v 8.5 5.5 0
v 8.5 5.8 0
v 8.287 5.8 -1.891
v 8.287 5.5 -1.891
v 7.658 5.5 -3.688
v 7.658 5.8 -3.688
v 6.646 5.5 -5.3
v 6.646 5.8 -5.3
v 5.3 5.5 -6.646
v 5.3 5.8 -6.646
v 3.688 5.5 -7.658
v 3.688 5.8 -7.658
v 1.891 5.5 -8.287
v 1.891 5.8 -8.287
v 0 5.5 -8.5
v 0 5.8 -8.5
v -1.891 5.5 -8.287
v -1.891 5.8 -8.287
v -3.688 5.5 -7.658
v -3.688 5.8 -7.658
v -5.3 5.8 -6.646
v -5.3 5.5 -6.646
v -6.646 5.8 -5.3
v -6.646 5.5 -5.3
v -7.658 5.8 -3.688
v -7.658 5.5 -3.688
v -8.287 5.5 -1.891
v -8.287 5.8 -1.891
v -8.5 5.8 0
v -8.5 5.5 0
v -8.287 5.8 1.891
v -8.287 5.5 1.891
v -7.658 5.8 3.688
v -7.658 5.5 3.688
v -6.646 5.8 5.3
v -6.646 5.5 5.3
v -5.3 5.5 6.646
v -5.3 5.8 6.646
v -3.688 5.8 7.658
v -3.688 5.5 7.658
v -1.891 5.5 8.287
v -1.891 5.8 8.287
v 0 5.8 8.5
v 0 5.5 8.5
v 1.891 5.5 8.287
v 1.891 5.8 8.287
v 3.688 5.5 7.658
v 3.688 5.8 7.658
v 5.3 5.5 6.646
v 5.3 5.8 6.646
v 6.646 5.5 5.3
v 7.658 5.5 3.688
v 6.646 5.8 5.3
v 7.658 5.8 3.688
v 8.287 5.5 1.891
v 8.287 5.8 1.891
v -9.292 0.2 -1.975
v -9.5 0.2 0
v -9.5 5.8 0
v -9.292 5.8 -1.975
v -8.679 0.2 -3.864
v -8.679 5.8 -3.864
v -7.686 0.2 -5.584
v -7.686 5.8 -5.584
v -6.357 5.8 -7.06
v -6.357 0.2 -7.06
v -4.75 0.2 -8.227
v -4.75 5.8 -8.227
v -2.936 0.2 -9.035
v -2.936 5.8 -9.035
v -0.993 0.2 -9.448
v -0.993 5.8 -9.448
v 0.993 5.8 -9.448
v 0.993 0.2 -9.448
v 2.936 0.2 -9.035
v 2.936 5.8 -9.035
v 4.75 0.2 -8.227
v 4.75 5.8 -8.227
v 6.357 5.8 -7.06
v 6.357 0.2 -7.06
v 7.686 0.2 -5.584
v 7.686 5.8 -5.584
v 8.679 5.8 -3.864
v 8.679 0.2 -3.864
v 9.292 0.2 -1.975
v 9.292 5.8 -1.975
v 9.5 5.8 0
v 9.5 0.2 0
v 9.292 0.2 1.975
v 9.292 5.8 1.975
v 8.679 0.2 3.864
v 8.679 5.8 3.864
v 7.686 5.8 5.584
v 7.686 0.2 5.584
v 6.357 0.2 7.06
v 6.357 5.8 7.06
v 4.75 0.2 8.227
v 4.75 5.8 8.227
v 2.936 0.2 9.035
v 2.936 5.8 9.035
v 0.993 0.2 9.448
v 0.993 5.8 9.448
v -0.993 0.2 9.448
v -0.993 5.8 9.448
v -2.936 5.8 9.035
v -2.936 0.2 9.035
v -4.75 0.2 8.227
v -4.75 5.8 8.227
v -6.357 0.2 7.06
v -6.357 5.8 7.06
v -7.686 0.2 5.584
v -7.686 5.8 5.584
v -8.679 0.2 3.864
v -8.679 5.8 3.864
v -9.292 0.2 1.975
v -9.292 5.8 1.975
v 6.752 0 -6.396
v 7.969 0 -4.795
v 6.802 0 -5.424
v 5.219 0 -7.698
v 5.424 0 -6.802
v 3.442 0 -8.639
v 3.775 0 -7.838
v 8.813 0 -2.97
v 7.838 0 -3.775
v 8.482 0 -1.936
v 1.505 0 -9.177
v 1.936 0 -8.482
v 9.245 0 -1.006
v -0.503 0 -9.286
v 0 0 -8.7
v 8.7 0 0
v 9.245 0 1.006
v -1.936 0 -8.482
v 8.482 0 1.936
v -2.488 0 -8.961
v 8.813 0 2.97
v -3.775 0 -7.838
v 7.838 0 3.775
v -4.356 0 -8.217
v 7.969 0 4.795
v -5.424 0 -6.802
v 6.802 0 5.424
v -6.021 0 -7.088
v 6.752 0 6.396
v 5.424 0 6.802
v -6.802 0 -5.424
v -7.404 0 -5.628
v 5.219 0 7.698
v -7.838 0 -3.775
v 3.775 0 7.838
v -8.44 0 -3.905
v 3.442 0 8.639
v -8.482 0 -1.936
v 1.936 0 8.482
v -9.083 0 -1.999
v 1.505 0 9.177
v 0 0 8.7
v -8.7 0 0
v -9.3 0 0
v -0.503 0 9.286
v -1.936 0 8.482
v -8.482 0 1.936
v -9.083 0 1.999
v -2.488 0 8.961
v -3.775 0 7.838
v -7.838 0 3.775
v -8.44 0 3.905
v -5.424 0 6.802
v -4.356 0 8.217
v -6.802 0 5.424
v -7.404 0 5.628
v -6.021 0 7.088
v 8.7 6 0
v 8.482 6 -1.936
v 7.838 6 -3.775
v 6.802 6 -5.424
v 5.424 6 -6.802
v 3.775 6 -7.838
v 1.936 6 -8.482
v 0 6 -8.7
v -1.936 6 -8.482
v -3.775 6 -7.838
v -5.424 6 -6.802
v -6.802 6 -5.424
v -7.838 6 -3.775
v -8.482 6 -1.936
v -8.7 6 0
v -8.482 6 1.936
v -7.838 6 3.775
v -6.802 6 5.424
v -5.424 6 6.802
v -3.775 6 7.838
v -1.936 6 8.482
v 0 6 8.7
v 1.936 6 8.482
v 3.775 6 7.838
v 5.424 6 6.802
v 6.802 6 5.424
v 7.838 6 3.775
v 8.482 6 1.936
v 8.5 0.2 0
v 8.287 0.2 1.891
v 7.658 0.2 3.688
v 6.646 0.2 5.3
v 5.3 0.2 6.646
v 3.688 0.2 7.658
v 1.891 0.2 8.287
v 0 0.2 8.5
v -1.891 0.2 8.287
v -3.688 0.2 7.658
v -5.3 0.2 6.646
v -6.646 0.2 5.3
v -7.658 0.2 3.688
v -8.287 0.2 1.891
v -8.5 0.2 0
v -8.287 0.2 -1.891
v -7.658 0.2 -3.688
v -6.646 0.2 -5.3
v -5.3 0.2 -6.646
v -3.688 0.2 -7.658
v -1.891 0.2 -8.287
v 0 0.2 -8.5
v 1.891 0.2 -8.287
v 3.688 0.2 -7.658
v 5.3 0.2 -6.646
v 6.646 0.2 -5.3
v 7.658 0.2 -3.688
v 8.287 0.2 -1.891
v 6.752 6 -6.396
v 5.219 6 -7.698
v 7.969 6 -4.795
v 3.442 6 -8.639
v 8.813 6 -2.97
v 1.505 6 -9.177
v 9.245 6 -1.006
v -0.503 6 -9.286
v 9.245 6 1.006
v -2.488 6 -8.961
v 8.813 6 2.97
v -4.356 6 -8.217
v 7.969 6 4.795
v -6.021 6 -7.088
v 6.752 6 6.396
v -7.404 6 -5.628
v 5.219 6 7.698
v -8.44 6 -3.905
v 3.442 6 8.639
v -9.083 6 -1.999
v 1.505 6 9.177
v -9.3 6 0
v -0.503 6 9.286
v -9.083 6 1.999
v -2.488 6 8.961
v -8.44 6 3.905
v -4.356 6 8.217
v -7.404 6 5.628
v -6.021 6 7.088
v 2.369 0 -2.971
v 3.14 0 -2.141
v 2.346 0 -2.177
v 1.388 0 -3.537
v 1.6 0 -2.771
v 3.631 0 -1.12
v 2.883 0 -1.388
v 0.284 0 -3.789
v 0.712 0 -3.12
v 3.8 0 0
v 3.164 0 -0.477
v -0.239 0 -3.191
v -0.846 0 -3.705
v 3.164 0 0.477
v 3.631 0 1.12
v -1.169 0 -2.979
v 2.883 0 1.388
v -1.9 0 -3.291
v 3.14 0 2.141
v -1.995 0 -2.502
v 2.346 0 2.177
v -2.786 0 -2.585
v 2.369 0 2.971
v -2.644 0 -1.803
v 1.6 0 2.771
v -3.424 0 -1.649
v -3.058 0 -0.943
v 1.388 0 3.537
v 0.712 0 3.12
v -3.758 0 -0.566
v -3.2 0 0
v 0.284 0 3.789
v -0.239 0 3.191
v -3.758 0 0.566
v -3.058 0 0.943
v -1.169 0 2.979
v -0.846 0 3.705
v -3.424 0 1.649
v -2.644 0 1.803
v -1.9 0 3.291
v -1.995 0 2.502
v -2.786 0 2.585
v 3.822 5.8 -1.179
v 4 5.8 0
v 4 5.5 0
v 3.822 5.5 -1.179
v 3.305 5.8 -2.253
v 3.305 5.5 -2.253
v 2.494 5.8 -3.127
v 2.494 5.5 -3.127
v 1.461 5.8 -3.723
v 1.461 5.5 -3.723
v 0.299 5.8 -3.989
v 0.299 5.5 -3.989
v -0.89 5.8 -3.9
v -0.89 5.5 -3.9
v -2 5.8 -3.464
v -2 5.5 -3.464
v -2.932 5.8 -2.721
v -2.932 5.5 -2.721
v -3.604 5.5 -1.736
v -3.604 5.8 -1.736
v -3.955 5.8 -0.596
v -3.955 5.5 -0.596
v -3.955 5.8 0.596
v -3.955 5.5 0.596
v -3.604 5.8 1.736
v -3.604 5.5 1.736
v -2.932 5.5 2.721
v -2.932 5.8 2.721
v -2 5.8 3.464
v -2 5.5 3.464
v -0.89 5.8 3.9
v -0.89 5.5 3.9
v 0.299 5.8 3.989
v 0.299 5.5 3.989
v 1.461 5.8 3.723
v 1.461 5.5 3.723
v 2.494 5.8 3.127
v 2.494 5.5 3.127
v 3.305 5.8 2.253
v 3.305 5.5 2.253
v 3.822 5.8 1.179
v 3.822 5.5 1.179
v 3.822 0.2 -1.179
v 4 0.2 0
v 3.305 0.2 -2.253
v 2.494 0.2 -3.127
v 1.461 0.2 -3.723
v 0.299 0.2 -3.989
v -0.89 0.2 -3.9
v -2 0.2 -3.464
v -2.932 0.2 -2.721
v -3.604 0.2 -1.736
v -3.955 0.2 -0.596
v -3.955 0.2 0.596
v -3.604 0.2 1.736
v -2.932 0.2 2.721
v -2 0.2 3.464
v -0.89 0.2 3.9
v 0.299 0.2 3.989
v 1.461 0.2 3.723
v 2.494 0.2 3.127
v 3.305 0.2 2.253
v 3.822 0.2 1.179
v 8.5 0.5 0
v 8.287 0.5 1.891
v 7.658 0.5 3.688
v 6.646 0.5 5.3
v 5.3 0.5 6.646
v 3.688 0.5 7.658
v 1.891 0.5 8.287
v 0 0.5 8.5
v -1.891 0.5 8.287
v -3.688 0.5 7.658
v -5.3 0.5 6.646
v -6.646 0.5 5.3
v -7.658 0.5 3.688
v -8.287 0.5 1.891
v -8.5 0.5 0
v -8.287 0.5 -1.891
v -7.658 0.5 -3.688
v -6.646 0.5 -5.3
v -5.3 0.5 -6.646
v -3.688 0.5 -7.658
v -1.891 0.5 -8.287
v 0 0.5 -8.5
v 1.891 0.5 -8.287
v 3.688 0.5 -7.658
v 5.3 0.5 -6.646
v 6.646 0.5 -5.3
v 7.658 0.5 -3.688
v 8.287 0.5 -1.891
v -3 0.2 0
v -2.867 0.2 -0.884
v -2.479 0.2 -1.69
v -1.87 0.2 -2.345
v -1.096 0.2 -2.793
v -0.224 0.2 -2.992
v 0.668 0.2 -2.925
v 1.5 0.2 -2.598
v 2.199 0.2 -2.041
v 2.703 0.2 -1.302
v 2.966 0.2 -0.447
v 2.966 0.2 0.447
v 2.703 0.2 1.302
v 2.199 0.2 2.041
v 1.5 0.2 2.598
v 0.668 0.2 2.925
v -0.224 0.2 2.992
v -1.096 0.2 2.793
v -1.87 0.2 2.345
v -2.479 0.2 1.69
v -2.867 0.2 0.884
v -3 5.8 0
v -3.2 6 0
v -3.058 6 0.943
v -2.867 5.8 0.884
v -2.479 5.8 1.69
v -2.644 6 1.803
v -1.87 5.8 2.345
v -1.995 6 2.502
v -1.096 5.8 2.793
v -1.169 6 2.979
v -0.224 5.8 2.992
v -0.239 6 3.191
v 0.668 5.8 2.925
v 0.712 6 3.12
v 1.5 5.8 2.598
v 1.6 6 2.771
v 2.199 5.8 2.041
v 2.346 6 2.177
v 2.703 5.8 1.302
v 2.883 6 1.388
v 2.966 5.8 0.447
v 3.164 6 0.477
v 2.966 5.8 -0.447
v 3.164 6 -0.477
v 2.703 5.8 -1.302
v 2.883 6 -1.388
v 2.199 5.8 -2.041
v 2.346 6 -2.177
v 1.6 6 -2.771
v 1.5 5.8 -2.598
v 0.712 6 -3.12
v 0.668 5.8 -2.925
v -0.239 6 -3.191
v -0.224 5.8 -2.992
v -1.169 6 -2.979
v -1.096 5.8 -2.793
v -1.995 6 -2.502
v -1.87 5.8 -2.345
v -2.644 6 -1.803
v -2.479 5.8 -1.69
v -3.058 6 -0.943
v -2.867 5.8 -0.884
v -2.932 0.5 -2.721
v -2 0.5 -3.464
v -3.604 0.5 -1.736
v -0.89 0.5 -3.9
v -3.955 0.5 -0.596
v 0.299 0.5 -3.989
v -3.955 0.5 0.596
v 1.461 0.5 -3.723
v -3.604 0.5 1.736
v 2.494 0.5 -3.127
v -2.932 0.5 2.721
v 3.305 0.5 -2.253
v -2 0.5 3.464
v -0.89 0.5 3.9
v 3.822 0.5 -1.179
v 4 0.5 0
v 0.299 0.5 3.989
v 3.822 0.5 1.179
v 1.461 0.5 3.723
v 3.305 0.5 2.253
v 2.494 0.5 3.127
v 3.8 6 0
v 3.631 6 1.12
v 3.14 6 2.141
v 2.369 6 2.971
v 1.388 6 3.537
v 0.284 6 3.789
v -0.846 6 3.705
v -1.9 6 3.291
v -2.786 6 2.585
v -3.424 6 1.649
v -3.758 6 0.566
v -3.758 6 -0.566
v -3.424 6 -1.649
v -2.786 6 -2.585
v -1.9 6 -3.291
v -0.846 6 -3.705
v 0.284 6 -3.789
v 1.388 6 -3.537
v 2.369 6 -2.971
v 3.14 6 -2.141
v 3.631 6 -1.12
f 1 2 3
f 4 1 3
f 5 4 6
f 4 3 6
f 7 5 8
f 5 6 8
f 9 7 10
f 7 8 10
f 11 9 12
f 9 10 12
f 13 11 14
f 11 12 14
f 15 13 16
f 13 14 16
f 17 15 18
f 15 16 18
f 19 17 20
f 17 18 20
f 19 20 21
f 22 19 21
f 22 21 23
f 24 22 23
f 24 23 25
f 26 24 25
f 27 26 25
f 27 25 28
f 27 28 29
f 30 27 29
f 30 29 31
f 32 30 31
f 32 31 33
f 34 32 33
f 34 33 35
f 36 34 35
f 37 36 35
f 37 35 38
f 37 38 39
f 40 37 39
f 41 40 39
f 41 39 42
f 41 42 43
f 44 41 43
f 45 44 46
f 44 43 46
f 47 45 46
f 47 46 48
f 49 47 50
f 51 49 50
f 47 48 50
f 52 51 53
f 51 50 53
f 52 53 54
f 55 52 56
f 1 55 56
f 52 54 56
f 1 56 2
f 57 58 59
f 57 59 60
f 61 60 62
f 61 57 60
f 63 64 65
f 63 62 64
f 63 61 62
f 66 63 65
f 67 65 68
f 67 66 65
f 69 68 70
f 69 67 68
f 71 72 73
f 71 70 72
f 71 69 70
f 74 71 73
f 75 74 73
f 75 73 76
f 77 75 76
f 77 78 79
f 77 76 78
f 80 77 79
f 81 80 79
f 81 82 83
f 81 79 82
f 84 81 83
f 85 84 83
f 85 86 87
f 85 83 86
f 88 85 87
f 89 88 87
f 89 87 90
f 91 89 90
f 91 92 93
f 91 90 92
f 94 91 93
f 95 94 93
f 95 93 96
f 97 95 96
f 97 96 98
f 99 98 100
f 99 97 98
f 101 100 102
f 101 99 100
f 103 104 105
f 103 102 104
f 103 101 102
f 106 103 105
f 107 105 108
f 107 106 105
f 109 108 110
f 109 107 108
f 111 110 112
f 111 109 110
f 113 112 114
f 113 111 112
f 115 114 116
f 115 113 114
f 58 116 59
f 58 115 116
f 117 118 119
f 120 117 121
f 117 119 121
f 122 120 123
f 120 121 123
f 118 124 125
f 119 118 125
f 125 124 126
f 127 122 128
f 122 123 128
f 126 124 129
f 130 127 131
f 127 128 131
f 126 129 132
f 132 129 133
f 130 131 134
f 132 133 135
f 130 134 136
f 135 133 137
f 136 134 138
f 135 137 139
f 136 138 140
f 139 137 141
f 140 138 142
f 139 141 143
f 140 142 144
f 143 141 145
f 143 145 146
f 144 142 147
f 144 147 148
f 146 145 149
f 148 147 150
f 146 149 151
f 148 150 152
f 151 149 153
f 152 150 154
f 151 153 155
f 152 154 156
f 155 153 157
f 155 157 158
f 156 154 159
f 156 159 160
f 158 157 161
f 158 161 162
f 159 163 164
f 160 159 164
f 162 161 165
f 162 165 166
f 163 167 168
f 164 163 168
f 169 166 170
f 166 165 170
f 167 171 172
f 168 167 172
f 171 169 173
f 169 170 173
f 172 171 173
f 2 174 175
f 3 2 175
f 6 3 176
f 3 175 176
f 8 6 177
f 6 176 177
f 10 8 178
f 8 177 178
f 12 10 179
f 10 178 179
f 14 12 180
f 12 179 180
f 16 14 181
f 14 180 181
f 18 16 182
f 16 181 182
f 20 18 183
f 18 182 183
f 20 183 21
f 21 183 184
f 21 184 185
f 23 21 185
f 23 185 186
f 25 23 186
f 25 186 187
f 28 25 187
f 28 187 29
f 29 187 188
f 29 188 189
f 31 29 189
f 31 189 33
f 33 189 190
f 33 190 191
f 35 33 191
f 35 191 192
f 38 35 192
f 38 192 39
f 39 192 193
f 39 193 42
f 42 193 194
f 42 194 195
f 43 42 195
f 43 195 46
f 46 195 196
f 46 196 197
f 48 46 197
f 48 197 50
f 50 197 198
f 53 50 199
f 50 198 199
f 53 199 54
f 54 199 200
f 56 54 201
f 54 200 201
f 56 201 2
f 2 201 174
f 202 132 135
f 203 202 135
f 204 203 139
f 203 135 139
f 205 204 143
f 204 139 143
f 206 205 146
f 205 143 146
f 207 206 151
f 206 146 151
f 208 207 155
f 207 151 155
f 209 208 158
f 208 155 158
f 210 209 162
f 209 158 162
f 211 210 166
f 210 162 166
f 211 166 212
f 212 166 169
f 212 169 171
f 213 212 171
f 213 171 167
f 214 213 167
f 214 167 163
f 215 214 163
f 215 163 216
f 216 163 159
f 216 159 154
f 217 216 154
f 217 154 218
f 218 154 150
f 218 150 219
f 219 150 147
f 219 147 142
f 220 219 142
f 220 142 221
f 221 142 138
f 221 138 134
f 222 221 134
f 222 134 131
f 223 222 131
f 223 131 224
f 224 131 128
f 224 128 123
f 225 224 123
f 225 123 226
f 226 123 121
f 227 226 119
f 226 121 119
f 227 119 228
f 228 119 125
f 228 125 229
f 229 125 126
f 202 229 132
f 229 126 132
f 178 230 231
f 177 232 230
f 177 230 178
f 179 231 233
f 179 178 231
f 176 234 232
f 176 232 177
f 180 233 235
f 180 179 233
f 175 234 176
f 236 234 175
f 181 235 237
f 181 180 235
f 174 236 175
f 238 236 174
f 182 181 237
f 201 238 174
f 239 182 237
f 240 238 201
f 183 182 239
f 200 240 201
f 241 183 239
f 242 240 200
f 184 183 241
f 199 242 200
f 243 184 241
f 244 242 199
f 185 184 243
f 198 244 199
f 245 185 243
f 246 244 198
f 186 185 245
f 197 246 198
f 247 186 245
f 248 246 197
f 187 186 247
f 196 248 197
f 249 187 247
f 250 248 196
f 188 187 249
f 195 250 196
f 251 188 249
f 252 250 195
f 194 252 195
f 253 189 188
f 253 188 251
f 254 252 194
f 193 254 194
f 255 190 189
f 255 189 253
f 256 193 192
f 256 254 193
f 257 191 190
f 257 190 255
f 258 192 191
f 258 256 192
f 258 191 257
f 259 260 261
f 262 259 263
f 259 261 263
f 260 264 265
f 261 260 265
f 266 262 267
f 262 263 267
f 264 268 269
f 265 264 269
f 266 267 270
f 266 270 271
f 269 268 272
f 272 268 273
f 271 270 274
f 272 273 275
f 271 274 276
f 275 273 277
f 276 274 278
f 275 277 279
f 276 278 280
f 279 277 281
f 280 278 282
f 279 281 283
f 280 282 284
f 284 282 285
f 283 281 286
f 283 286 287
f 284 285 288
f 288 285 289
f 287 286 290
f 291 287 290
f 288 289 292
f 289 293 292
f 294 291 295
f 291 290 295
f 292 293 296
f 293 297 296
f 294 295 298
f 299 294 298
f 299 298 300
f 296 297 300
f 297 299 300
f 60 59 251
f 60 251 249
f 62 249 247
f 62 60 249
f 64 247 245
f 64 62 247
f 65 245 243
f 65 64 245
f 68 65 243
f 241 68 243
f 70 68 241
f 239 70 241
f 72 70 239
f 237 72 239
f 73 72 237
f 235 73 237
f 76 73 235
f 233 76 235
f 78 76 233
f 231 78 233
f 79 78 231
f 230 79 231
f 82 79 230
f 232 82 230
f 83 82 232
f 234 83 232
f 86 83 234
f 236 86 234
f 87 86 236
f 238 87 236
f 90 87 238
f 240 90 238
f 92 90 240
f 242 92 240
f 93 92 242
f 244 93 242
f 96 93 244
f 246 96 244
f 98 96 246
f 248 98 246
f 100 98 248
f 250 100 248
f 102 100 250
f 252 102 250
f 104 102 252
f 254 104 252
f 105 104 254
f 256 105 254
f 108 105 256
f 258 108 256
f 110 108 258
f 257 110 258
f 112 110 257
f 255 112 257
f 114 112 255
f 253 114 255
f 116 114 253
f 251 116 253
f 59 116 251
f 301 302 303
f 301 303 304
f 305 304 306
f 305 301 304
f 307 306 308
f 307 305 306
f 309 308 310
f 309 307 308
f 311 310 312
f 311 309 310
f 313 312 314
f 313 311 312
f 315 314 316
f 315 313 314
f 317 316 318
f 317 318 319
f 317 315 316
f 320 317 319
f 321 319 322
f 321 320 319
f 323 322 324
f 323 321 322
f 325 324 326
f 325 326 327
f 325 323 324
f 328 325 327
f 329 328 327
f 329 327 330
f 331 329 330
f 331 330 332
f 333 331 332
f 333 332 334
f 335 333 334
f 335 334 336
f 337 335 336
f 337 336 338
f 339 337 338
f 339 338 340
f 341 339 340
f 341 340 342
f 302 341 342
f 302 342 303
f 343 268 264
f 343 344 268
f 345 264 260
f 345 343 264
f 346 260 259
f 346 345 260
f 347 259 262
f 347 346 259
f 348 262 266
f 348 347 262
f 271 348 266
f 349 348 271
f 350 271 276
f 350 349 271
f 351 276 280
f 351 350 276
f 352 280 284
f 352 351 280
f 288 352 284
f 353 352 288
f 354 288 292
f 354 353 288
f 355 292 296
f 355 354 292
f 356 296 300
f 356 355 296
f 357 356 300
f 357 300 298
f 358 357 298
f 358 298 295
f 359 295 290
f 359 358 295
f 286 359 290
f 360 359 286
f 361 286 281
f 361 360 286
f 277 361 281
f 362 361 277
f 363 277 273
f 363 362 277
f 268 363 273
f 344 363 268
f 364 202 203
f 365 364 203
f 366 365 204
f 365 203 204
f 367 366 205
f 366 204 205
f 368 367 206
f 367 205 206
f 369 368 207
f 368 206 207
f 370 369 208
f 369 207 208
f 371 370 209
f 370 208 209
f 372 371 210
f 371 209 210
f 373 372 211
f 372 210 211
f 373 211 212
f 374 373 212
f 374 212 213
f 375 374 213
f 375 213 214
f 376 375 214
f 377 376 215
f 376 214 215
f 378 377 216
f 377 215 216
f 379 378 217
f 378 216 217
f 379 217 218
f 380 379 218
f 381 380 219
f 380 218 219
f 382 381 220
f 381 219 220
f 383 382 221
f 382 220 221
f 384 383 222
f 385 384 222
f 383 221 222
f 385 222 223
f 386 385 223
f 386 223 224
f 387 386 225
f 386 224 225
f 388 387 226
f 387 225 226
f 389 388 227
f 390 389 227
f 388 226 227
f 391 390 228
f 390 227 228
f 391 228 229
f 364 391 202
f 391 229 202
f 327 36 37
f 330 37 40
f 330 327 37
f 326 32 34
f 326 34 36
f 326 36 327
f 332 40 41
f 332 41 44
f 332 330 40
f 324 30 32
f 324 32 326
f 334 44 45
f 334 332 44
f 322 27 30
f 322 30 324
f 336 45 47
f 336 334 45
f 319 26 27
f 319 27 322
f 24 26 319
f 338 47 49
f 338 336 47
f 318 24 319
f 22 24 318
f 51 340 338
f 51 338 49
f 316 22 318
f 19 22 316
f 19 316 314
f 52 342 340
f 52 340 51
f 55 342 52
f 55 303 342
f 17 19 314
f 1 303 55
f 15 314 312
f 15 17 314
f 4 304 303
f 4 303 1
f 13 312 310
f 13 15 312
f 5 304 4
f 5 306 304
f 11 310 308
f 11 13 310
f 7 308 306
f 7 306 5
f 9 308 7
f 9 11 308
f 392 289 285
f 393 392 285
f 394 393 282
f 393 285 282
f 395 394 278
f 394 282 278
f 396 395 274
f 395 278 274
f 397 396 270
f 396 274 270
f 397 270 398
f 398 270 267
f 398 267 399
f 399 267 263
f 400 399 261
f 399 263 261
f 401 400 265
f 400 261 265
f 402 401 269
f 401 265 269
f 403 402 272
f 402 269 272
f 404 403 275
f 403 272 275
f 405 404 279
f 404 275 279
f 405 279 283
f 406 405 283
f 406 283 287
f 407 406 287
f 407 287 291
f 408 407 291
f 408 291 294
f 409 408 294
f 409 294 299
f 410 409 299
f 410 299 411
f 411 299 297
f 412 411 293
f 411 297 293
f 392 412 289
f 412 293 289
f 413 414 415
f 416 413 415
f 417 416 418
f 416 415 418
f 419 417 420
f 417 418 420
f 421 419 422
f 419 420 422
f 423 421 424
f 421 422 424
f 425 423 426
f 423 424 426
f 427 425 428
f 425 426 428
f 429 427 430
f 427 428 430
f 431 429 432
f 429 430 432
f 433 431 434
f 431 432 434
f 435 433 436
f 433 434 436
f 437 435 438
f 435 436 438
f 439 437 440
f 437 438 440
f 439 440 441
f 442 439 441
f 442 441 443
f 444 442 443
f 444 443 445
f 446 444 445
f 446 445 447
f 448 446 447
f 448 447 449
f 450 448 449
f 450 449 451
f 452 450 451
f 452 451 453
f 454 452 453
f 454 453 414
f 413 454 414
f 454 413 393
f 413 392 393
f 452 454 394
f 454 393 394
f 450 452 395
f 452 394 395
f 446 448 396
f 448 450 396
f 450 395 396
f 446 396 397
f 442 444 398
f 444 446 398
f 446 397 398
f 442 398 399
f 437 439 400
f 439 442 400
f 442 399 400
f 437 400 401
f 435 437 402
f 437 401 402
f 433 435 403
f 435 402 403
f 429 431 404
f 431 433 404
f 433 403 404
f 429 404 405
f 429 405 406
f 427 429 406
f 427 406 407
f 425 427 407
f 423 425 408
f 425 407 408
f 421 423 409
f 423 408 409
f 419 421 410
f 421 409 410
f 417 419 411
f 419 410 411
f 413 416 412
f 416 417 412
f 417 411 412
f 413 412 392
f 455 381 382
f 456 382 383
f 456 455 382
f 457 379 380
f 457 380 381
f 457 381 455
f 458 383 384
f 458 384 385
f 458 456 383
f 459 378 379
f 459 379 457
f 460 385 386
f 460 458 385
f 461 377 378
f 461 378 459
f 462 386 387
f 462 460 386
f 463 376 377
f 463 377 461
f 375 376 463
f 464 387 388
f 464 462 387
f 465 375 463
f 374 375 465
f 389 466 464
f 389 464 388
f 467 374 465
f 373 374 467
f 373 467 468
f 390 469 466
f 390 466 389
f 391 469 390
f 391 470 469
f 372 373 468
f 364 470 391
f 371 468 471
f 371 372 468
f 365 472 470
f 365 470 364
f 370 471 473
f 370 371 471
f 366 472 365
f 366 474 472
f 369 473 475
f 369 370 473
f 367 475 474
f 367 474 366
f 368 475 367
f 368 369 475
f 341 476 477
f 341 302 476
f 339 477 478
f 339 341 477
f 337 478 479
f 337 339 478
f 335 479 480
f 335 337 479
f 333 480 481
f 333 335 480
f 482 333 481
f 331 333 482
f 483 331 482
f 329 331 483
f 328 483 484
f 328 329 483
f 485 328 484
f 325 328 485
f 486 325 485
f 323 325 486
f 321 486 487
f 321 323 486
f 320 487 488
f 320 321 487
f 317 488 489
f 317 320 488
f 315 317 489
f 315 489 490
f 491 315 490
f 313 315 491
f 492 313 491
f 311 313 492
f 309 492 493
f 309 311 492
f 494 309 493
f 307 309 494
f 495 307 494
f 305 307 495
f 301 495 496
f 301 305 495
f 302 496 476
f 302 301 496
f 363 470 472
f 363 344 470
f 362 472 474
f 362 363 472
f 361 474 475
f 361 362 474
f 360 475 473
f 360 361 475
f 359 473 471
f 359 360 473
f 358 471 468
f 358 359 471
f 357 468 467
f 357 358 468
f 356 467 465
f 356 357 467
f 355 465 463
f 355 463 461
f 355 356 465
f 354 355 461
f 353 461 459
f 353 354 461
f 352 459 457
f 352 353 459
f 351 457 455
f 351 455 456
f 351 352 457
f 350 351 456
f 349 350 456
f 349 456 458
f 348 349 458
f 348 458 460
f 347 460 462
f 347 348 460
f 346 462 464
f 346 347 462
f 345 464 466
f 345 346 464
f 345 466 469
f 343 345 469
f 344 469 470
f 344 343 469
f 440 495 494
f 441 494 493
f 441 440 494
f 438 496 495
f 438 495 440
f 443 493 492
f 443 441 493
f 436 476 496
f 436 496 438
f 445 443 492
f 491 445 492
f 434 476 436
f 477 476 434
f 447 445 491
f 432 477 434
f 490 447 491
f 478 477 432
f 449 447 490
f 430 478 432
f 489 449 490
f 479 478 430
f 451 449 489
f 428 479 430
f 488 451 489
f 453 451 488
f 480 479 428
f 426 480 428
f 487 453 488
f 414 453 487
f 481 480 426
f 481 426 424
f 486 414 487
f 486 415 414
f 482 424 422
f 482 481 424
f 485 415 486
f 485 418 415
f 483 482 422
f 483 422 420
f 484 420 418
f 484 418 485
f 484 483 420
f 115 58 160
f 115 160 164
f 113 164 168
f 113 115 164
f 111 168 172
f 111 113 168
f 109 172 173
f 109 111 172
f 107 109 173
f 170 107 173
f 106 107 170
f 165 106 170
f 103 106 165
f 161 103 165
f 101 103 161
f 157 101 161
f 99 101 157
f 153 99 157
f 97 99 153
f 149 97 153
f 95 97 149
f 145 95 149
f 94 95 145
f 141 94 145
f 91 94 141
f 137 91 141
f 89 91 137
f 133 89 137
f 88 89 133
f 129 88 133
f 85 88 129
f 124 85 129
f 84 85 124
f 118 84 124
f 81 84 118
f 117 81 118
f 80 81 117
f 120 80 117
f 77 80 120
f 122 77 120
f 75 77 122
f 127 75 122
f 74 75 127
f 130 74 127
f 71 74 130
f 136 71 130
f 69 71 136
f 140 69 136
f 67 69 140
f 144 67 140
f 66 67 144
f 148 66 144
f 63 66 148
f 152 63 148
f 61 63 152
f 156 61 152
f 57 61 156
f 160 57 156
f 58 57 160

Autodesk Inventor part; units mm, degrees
ref_plane "YZ Plane" through (0, 0, 0) normal (1, 0, 0) x (0, 1, 0)
ref_plane "XZ Plane" through (0, 0, 0) normal (0, 1, 0) x (-1, 0, 0)
ref_plane "XY Plane" through (0, 0, 0) normal (0, 0, 1) x (1, 0, 0)
sketch "Эскиз1" plane through (0, 0, 0) normal (0, 1, 0) x (-1, 0, 0)
  circle A0 centre (0, 0) radius 9.5
  circle A1 centre (0, 0) radius 3
  dimension "d0" = 19
  dimension "d1" = 6
extrude "Выдавливание1" add sketch "Эскиз1" along normal blind 6
sketch "Эскиз2" plane through (0, 6, 0) normal (0, 1, 0) x (1, 0, 0)
  circle A0 centre (0, 0) radius 4
  circle A1 centre (0, 0) radius 8.5
  circle A2 centre (0, 0) radius 9.5 projected
  circle A3 centre (0, 0) radius 3 projected
  dimension "d4" = 1
  dimension "d5" = 1
extrude "Выдавливание2" cut sketch "Эскиз2" against normal blind 0.5 contours A1
sketch "Эскиз3" plane through (0, 0, 0) normal (0, -1, 0) x (1, 0, 0)
  circle A0 centre (0, 0) radius 4 projected
  circle A1 centre (0, 0) radius 8.5 projected
extrude "Выдавливание3" cut sketch "Эскиз3" against normal blind 0.5
chamfer "Фаска1" distance 0.2 angle 45 8 edges at (-4, 0, 0) (3, 0, 0) (-8.5, 0, 0) (9.5, 0, 0) (9.5, 6, 0) (-8.5, 6, 0) (-4, 6, 0) (3, 6, 0)
properties part number "Подшипник 626Z" material "Титан"
